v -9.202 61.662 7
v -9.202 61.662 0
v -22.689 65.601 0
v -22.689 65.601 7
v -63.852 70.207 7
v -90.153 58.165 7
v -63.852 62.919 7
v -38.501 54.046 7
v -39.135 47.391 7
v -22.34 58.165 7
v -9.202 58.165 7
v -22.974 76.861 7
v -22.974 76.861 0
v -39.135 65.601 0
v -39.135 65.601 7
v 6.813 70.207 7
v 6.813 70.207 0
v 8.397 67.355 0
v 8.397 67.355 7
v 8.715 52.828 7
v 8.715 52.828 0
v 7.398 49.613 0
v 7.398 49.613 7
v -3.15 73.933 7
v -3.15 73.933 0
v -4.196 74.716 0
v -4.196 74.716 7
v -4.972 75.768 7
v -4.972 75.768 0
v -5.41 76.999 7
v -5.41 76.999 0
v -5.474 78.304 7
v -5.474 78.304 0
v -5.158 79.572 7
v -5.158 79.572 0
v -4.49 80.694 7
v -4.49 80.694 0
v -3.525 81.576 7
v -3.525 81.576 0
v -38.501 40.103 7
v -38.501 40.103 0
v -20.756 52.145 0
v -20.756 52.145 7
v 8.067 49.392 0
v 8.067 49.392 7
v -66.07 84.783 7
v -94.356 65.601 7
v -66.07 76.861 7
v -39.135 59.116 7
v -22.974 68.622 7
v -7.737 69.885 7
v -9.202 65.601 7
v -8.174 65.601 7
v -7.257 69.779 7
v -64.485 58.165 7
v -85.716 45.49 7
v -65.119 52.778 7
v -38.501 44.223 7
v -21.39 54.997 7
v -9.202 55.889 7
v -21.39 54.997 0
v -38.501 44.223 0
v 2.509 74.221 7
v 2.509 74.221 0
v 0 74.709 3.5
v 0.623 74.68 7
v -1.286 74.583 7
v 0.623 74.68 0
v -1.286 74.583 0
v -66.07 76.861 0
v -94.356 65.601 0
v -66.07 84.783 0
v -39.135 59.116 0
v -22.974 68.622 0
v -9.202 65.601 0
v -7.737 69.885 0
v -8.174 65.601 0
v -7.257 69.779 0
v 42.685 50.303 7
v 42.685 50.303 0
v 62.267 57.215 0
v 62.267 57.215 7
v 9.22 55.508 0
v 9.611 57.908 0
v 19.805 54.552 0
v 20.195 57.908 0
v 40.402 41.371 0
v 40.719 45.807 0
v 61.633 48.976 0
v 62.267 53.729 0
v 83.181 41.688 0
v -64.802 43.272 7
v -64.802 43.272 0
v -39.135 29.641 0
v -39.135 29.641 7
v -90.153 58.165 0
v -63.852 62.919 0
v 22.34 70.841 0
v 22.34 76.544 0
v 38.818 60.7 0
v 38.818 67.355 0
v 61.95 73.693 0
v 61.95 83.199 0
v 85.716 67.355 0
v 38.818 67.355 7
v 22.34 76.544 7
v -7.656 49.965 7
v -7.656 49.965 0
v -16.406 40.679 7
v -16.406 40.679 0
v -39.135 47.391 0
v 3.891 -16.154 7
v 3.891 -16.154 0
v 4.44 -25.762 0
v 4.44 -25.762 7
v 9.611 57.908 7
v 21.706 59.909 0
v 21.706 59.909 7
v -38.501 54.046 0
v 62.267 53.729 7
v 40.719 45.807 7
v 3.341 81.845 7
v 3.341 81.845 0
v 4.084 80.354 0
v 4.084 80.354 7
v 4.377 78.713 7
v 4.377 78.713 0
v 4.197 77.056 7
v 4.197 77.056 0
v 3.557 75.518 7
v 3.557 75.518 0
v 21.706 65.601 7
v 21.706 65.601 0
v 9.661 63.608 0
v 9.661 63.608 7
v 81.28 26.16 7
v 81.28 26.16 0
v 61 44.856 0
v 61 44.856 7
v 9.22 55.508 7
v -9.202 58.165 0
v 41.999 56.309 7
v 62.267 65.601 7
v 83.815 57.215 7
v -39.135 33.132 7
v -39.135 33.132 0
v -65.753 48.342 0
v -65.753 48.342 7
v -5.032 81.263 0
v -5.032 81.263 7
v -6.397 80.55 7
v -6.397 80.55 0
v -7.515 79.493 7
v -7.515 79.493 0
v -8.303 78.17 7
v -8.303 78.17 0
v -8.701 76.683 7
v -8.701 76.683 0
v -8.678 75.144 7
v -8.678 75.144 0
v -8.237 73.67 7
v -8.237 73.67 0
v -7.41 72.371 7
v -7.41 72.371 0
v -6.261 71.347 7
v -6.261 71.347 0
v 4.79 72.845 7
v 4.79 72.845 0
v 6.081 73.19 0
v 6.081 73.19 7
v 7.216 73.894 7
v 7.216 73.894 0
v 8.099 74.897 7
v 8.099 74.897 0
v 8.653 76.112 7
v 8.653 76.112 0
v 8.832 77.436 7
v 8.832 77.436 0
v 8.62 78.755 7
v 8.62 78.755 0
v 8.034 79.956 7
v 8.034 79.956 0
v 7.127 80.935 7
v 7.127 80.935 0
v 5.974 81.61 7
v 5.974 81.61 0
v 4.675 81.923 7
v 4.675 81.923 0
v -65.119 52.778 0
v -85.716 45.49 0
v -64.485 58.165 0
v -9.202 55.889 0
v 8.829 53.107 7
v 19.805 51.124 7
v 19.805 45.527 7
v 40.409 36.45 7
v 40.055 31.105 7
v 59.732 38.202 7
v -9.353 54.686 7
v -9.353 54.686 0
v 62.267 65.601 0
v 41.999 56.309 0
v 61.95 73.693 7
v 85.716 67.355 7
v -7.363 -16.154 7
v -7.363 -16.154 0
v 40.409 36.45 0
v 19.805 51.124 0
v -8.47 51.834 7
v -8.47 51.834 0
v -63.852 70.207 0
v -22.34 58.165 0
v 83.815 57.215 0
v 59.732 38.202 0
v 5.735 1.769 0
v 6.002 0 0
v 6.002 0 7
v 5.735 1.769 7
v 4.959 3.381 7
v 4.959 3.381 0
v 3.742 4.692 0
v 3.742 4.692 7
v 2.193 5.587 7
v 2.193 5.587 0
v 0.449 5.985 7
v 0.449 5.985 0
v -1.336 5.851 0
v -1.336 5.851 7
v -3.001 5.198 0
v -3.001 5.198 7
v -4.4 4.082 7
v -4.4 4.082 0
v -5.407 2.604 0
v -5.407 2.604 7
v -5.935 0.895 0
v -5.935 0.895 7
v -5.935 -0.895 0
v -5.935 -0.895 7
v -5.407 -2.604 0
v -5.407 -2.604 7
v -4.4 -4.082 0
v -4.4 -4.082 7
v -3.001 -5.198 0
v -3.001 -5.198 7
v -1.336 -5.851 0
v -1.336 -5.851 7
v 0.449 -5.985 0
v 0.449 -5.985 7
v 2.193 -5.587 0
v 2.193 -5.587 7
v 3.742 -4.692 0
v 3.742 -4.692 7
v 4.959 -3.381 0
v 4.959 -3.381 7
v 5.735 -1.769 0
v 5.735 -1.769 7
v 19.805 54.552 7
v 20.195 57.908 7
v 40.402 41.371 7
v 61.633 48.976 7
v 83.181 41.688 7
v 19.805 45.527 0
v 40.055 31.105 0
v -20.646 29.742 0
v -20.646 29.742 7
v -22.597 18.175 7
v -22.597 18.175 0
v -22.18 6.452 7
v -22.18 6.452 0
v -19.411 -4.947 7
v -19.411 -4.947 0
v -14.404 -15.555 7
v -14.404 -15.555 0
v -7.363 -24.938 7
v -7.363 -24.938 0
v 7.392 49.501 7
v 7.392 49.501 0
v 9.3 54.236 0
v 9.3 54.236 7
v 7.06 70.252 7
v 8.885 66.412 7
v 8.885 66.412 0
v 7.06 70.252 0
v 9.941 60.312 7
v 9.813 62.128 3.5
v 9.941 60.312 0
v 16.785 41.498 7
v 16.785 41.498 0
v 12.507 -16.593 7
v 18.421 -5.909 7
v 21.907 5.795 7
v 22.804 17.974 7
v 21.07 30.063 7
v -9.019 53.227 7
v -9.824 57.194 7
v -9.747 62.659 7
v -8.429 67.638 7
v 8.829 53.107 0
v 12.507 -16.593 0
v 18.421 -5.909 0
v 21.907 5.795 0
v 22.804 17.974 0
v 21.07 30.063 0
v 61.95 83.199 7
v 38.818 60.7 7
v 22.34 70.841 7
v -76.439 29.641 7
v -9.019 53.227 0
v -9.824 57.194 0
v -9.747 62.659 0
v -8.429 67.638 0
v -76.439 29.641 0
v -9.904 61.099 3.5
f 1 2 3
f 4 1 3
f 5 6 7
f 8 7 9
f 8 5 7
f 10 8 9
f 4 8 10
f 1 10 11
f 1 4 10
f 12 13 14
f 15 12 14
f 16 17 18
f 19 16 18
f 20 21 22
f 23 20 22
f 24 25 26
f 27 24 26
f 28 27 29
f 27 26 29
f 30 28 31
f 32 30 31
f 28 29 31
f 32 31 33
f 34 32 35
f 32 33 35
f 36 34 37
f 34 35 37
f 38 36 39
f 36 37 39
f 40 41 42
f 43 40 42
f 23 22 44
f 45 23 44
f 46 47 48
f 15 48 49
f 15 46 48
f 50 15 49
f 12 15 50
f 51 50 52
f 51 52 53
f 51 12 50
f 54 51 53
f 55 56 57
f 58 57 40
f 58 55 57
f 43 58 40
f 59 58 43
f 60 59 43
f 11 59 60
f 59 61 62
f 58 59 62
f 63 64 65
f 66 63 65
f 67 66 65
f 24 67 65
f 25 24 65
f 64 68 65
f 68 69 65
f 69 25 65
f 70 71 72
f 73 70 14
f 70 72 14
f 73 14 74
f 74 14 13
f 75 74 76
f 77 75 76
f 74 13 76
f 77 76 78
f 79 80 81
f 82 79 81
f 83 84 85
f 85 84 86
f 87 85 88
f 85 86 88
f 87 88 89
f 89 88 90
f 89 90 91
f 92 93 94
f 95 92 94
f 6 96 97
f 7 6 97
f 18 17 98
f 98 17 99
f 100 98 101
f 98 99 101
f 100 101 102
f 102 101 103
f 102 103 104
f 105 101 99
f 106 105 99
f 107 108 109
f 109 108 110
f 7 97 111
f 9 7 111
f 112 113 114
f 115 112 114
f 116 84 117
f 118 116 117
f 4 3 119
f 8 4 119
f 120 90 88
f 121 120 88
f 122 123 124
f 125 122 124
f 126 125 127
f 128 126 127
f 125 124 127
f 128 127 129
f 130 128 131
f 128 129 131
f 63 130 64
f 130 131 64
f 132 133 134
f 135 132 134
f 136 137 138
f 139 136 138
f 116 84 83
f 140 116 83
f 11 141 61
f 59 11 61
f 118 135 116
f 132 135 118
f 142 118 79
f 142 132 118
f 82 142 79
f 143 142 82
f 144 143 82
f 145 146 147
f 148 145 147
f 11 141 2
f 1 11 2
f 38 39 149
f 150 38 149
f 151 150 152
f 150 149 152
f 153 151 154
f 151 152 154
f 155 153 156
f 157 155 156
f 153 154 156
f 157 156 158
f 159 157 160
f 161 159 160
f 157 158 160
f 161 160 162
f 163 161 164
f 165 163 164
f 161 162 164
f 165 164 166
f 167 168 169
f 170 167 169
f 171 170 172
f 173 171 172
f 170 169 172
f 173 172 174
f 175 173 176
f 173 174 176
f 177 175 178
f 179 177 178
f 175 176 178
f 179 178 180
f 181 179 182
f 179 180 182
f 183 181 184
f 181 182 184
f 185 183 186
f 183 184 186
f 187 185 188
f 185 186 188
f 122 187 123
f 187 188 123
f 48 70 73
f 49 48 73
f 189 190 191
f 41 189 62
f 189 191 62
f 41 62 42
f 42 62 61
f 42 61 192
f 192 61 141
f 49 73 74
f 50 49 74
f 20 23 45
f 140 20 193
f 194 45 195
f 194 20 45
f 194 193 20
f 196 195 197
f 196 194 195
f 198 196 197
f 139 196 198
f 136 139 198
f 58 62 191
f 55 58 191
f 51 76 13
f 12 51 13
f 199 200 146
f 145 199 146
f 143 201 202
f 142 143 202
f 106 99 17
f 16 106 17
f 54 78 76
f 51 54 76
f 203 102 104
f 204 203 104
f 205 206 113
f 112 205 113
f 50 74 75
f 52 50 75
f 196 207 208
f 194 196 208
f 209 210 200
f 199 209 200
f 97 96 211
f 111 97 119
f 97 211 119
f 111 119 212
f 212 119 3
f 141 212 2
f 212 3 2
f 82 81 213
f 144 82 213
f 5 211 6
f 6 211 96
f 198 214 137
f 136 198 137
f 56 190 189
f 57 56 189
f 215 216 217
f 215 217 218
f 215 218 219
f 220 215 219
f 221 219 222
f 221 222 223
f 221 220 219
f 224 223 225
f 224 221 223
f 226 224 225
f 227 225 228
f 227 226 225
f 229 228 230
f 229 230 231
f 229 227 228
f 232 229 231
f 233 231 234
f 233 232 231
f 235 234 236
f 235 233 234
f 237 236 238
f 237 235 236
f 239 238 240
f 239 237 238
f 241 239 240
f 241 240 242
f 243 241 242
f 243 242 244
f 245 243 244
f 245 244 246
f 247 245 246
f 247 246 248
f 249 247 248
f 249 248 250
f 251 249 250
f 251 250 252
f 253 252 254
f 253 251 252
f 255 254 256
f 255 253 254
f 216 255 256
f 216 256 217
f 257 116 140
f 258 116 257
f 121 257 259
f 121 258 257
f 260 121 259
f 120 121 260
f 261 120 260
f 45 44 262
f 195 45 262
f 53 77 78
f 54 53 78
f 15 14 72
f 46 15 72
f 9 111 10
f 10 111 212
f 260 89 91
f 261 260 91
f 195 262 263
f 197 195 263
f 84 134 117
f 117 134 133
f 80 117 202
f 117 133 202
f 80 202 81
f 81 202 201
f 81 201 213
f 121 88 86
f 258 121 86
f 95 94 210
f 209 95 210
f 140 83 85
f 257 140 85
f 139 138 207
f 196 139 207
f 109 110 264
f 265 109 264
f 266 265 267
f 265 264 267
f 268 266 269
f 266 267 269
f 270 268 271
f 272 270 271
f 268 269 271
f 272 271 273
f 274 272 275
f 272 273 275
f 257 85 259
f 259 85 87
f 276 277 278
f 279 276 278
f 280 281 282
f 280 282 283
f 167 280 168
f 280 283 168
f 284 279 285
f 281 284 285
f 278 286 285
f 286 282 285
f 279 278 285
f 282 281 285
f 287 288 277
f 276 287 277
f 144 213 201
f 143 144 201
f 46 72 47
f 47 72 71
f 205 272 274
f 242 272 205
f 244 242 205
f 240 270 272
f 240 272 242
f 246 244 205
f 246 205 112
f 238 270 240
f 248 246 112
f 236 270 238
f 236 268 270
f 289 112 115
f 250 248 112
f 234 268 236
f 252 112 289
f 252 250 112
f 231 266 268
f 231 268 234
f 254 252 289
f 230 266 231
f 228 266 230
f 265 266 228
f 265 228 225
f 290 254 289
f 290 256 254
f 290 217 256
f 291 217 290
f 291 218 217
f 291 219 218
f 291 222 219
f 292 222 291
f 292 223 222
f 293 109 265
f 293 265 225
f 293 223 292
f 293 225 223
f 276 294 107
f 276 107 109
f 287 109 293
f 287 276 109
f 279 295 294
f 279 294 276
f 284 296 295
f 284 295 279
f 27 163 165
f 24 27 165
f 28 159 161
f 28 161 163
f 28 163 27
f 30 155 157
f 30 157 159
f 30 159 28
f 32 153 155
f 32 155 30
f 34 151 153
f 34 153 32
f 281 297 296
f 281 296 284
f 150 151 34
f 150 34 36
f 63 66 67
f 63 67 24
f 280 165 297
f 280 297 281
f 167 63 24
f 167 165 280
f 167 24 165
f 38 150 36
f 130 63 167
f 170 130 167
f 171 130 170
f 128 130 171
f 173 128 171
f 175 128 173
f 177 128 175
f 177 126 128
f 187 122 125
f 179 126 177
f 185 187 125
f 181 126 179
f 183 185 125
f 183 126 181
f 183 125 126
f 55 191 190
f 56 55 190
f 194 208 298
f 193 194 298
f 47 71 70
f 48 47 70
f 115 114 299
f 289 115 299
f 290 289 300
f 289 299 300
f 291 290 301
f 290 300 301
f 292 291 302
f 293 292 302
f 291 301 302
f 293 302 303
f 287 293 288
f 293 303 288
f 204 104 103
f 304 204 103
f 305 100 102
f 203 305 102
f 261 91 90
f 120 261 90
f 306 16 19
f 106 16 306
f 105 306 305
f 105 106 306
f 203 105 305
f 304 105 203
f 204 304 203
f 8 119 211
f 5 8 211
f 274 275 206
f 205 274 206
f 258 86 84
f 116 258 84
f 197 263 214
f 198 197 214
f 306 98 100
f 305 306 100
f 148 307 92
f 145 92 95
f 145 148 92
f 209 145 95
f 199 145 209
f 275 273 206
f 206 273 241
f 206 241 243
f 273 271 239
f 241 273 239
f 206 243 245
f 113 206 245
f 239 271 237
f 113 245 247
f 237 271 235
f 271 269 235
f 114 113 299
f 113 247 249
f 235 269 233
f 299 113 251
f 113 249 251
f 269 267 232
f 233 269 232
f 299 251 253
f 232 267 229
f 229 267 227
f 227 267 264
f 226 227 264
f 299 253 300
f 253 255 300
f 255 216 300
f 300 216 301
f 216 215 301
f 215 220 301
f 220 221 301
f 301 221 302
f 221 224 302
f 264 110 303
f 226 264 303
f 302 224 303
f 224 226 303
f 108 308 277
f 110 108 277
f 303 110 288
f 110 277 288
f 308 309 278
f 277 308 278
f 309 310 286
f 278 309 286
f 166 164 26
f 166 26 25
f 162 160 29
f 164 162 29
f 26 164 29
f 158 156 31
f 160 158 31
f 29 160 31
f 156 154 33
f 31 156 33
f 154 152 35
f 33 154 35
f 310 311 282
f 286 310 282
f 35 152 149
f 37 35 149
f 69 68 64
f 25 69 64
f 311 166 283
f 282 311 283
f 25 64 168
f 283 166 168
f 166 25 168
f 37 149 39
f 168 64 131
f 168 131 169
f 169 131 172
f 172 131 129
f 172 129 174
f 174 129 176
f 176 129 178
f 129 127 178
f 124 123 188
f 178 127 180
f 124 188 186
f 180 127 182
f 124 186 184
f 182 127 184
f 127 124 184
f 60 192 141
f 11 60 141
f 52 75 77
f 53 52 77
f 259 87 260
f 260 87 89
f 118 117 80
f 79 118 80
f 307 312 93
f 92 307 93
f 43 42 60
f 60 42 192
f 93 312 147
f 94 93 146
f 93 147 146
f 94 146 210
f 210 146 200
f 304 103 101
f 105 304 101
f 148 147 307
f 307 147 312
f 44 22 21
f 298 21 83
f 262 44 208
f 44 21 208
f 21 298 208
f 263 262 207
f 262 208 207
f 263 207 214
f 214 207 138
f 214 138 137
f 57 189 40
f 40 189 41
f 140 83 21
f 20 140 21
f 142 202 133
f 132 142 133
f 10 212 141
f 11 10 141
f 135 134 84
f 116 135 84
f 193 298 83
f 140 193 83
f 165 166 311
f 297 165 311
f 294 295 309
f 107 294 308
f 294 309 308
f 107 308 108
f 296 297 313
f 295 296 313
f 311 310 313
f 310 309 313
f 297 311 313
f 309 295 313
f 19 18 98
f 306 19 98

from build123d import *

# Parameters (mm, degrees)
F2_DEPTH = 7
F0_R     = 6.001793311


with BuildPart() as f2:
    # F1 (on Top) → F2 (new body)
    with BuildSketch(Plane.XY):
        Polygon((-9.2018917203, 65.600566566), (-7.7365781023, 69.8846236704), (-22.973915562, 76.861359179), (-39.1348786652, 65.600566566), (-66.0698190331, 84.7834050655), (-94.3563714088, 65.600566566), (-66.0698190331, 76.861359179), (-39.1348786652, 59.1159909964), (-22.973915562, 68.6224400997), align=None)
        Polygon((-8.6877066642, 65.600566566), (-7.7365781023, 69.8846236704), (-9.2018917203, 65.600566566), align=None)
        Polygon((-7.2574589443, 69.779494786), (-7.7365781023, 69.8846236704), (-8.6877066642, 65.600566566), (-8.1744042482, 65.600566566), align=None)
    extrude(amount=F2_DEPTH)


with BuildPart() as f2b:
    # F1 (on Top) → F2, piece 2 (new body)
    with BuildSketch(Plane.XY):
        Polygon((8.8290832937, 53.1067475677), (9.2201554216, 55.5075071752), (8.7148769459, 52.8279593083), align=None)
        Polygon((19.8051016778, 51.1241875359), (8.8290832937, 53.1067475677), (8.0670248717, 49.3923278159), (19.8051016778, 45.5273630774), (40.0554117326, 31.1052621913), (59.7321800888, 38.2018052042), (81.2801346183, 26.1603035033), (60.9997063875, 44.8563210666), (40.4092817274, 36.4500634091), align=None)
        Polygon((8.0670248717, 49.3923278159), (8.8290832937, 53.1067475677), (8.7148769459, 52.8279593083), align=None)
        Polygon((8.0670248717, 49.3923278159), (8.7148769459, 52.8279593083), (7.3977382849, 49.6127019964), align=None)
    extrude(amount=F2_DEPTH)


with BuildPart() as f2c:
    # F1 (on Top) → F2, piece 3 (new body)
    with BuildSketch(Plane.XY):
        Polygon((20.1951572392, 57.9082667828), (9.6112275496, 57.9082667828), (9.2201554216, 55.5075071752), (19.8051016778, 54.5517574751), (40.4024086893, 41.3706228137), (61.6334713995, 48.9757806063), (83.1814184785, 41.6875034571), (62.2672326863, 53.7290051579), (40.7192893326, 45.8069629967), align=None)
    extrude(amount=F2_DEPTH)


with BuildPart() as f2d:
    # F1 (on Top) → F2, piece 4 (new body)
    with BuildSketch(Plane.XY):
        Polygon((21.7063911259, 65.600566566), (9.6610620067, 63.6080494471), (9.6112275496, 57.9082667828), (21.7063911259, 59.9090274297), (42.6852558357, 50.3034128834), (62.2672326863, 57.2147034109), (83.8151872158, 57.2147034109), (62.2672326863, 65.600566566), (41.9985157897, 56.3093903969), align=None)
    extrude(amount=F2_DEPTH)


with BuildPart() as f2e:
    # F1 (on Top) → F2, piece 5 (new body)
    with BuildSketch(Plane.XY):
        Polygon((22.3401542753, 76.5444785357), (6.8129552528, 70.2068507671), (8.3973631263, 67.3549100757), (22.3401542753, 70.8406120539), (38.8179980218, 60.7004016638), (61.9503520429, 73.6925452948), (85.716471076, 67.3549100757), (61.9503520429, 83.1989943981), (38.8179980218, 67.3549100757), align=None)
    extrude(amount=F2_DEPTH)


with BuildPart() as f2f:
    # F1 (on Top) → F2, piece 6 (new body)
    with BuildSketch(Plane.XY):
        Polygon((-9.2018917203, 58.165345341), (-9.2018917203, 61.6621409912), (-22.6894478348, 65.600566566), (-38.5011173785, 54.0458858013), (-63.8516396284, 70.2068507671), (-90.1528149843, 58.165345341), (-63.8516396284, 62.9185736179), (-39.1348786652, 47.3913699389), (-22.3401524127, 58.165345341), align=None)
    extrude(amount=F2_DEPTH)


with BuildPart() as f2g:
    # F1 (on Top) → F2, piece 7 (new body)
    with BuildSketch(Plane.XY):
        Polygon((-9.2018917203, 55.8889657259), (-9.2018917203, 58.165345341), (-21.3895086199, 54.9965277314), (-38.5011173785, 44.2225560546), (-64.4854083657, 58.165345341), (-85.7164785266, 45.4900823534), (-65.1191696525, 52.7783595026), (-38.5011173785, 40.1030927896), (-20.7557454705, 52.1445982158), align=None)
    extrude(amount=F2_DEPTH)


with BuildPart() as f2h:
    # F1 (on Top) → F2, piece 8 (new body)
    with BuildSketch(Plane.XY):
        Polygon((-8.4703536704, 51.8341325223), (-9.3526932465, 54.686120996), (-39.1348786652, 33.1317000091), (-65.7529383898, 48.3420193195), (-76.4391598123, 29.6411311758), (-64.8022890091, 43.2719103992), (-39.1348786652, 29.6411311758), align=None)
    extrude(amount=F2_DEPTH)


with BuildPart() as f2i:
    # F0 (on Top) → F2, piece 9 (new body)
    with BuildSketch(Plane.XY):
        with BuildLine():
            add(Edge.make_bspline(
                [(2.5091840812, 74.2214696281), (1.275189863, 74.7092217207), (0, 74.7092217207)],
                knots=[6.0283090467, 6.0283090467, 6.0283090467, 6.2831853072, 6.2831853072, 6.2831853072], degree=2, weights=[1, 0.9918907452, 1]))
            add(Edge.make_bspline(
                [(0, 74.7092217207), (-1.6167117648, 74.7092217207), (-3.1502883978, 73.9328411143)],
                knots=[0, 0, 0, 0.322084502, 0.322084502, 0.322084502], degree=2, weights=[1, 0.9870606976, 1]))
            add(Edge.make_bspline(
                [(-3.1502883978, 73.9328411143), (-4.8597889321, 73.0673981799), (-6.2606890382, 71.3474702214)],
                knots=[0.322084502, 0.322084502, 0.322084502, 0.6803706018, 0.6803706018, 0.6803706018], degree=2, weights=[1, 0.9839967509, 1]))
            add(Edge.make_bspline(
                [(-6.2606890382, 71.3474702214), (-14.0956980801, 61.7281896981), (-7.6560782658, 49.9649534)],
                knots=[0.6803706018, 0.6803706018, 0.6803706018, 2.2638612684, 2.2638612684, 2.2638612684], degree=2, weights=[1, 0.702604441, 1]))
            add(Edge.make_bspline(
                [(-7.6560782658, 49.9649534), (-0.3089048412, 36.5438913486), (7.39151443, 49.5011744871)],
                knots=[2.2638612684, 2.2638612684, 2.2638612684, 3.9786977641, 3.9786977641, 3.9786977641], degree=2, weights=[1, 0.6543918533, 1]))
            add(Edge.make_bspline(
                [(7.39151443, 49.5011744871), (15.8091647836, 63.6653225872), (4.7904175132, 72.8450629179)],
                knots=[3.9786977641, 3.9786977641, 3.9786977641, 5.780994961, 5.780994961, 5.780994961], degree=2, weights=[1, 0.6207098304, 1]))
            add(Edge.make_bspline(
                [(4.7904175132, 72.8450629179), (3.7061840278, 73.7483399974), (2.5091840812, 74.2214696281)],
                knots=[5.780994961, 5.780994961, 5.780994961, 6.0283090467, 6.0283090467, 6.0283090467], degree=2, weights=[1, 0.9923642053, 1]))
        make_face()
        with BuildLine():
            add(Edge.make_bspline(
                [(-3.1502883978, 73.9328411143), (-4.8597889321, 73.0673981799), (-6.2606890382, 71.3474702214)],
                knots=[0.322084502, 0.322084502, 0.322084502, 0.6803706018, 0.6803706018, 0.6803706018], degree=2, weights=[1, 0.9839967509, 1]))
            ThreePointArc((-3.1502883978, 73.9328411143), (-5.4897898019, 77.648877575), (-3.5254174191, 81.5761457016))
            ThreePointArc((-3.5254174191, 81.5761457016), (-8.5534059956, 77.440630592), (-6.2606890382, 71.3474702214))
        make_face()
        with BuildLine():
            ThreePointArc((3.3414482051, 81.8452960515), (4.3461761215, 77.878272962), (2.5091840812, 74.2214696281))
            add(Edge.make_bspline(
                [(4.7904175132, 72.8450629179), (3.7061840278, 73.7483399974), (2.5091840812, 74.2214696281)],
                knots=[5.780994961, 5.780994961, 5.780994961, 6.0283090467, 6.0283090467, 6.0283090467], degree=2, weights=[1, 0.9923642053, 1]))
            ThreePointArc((4.7904175132, 72.8450629179), (8.7742862639, 78.1031886911), (3.3414482051, 81.8452960515))
        make_face()
        with BuildLine():
            add(Edge.make_bspline(
                [(-7.6560782658, 49.9649534), (-0.3089048412, 36.5438913486), (7.39151443, 49.5011744871)],
                knots=[2.2638612684, 2.2638612684, 2.2638612684, 3.9786977641, 3.9786977641, 3.9786977641], degree=2, weights=[1, 0.6543918533, 1]))
            Line((-7.6560782658, 49.9649534), (-16.4058412819, 40.6788752355))
            ThreePointArc((-16.4058412819, 40.6788752355), (-22.1797809449, 6.4515630322), (-7.3634781875, -24.9383151531))
            Line((-7.3634781875, -24.9383151531), (-7.3634781875, -16.1539614201))
            Line((-7.3634781875, -16.1539614201), (3.8914789911, -16.1539614201))
            Line((3.8914789911, -16.1539614201), (4.440499004, -25.7618501782))
            ThreePointArc((4.440499004, -25.7618501782), (21.9072802596, 5.7952549798), (16.7852827208, 41.4982586993))
            Line((16.7852827208, 41.4982586993), (7.39151443, 49.5011744871))
        make_face()
        Circle(F0_R, mode=Mode.SUBTRACT)
    extrude(amount=F2_DEPTH)


solid = Compound([f2.part, f2b.part, f2c.part, f2d.part, f2e.part, f2f.part, f2g.part, f2h.part, f2i.part])
